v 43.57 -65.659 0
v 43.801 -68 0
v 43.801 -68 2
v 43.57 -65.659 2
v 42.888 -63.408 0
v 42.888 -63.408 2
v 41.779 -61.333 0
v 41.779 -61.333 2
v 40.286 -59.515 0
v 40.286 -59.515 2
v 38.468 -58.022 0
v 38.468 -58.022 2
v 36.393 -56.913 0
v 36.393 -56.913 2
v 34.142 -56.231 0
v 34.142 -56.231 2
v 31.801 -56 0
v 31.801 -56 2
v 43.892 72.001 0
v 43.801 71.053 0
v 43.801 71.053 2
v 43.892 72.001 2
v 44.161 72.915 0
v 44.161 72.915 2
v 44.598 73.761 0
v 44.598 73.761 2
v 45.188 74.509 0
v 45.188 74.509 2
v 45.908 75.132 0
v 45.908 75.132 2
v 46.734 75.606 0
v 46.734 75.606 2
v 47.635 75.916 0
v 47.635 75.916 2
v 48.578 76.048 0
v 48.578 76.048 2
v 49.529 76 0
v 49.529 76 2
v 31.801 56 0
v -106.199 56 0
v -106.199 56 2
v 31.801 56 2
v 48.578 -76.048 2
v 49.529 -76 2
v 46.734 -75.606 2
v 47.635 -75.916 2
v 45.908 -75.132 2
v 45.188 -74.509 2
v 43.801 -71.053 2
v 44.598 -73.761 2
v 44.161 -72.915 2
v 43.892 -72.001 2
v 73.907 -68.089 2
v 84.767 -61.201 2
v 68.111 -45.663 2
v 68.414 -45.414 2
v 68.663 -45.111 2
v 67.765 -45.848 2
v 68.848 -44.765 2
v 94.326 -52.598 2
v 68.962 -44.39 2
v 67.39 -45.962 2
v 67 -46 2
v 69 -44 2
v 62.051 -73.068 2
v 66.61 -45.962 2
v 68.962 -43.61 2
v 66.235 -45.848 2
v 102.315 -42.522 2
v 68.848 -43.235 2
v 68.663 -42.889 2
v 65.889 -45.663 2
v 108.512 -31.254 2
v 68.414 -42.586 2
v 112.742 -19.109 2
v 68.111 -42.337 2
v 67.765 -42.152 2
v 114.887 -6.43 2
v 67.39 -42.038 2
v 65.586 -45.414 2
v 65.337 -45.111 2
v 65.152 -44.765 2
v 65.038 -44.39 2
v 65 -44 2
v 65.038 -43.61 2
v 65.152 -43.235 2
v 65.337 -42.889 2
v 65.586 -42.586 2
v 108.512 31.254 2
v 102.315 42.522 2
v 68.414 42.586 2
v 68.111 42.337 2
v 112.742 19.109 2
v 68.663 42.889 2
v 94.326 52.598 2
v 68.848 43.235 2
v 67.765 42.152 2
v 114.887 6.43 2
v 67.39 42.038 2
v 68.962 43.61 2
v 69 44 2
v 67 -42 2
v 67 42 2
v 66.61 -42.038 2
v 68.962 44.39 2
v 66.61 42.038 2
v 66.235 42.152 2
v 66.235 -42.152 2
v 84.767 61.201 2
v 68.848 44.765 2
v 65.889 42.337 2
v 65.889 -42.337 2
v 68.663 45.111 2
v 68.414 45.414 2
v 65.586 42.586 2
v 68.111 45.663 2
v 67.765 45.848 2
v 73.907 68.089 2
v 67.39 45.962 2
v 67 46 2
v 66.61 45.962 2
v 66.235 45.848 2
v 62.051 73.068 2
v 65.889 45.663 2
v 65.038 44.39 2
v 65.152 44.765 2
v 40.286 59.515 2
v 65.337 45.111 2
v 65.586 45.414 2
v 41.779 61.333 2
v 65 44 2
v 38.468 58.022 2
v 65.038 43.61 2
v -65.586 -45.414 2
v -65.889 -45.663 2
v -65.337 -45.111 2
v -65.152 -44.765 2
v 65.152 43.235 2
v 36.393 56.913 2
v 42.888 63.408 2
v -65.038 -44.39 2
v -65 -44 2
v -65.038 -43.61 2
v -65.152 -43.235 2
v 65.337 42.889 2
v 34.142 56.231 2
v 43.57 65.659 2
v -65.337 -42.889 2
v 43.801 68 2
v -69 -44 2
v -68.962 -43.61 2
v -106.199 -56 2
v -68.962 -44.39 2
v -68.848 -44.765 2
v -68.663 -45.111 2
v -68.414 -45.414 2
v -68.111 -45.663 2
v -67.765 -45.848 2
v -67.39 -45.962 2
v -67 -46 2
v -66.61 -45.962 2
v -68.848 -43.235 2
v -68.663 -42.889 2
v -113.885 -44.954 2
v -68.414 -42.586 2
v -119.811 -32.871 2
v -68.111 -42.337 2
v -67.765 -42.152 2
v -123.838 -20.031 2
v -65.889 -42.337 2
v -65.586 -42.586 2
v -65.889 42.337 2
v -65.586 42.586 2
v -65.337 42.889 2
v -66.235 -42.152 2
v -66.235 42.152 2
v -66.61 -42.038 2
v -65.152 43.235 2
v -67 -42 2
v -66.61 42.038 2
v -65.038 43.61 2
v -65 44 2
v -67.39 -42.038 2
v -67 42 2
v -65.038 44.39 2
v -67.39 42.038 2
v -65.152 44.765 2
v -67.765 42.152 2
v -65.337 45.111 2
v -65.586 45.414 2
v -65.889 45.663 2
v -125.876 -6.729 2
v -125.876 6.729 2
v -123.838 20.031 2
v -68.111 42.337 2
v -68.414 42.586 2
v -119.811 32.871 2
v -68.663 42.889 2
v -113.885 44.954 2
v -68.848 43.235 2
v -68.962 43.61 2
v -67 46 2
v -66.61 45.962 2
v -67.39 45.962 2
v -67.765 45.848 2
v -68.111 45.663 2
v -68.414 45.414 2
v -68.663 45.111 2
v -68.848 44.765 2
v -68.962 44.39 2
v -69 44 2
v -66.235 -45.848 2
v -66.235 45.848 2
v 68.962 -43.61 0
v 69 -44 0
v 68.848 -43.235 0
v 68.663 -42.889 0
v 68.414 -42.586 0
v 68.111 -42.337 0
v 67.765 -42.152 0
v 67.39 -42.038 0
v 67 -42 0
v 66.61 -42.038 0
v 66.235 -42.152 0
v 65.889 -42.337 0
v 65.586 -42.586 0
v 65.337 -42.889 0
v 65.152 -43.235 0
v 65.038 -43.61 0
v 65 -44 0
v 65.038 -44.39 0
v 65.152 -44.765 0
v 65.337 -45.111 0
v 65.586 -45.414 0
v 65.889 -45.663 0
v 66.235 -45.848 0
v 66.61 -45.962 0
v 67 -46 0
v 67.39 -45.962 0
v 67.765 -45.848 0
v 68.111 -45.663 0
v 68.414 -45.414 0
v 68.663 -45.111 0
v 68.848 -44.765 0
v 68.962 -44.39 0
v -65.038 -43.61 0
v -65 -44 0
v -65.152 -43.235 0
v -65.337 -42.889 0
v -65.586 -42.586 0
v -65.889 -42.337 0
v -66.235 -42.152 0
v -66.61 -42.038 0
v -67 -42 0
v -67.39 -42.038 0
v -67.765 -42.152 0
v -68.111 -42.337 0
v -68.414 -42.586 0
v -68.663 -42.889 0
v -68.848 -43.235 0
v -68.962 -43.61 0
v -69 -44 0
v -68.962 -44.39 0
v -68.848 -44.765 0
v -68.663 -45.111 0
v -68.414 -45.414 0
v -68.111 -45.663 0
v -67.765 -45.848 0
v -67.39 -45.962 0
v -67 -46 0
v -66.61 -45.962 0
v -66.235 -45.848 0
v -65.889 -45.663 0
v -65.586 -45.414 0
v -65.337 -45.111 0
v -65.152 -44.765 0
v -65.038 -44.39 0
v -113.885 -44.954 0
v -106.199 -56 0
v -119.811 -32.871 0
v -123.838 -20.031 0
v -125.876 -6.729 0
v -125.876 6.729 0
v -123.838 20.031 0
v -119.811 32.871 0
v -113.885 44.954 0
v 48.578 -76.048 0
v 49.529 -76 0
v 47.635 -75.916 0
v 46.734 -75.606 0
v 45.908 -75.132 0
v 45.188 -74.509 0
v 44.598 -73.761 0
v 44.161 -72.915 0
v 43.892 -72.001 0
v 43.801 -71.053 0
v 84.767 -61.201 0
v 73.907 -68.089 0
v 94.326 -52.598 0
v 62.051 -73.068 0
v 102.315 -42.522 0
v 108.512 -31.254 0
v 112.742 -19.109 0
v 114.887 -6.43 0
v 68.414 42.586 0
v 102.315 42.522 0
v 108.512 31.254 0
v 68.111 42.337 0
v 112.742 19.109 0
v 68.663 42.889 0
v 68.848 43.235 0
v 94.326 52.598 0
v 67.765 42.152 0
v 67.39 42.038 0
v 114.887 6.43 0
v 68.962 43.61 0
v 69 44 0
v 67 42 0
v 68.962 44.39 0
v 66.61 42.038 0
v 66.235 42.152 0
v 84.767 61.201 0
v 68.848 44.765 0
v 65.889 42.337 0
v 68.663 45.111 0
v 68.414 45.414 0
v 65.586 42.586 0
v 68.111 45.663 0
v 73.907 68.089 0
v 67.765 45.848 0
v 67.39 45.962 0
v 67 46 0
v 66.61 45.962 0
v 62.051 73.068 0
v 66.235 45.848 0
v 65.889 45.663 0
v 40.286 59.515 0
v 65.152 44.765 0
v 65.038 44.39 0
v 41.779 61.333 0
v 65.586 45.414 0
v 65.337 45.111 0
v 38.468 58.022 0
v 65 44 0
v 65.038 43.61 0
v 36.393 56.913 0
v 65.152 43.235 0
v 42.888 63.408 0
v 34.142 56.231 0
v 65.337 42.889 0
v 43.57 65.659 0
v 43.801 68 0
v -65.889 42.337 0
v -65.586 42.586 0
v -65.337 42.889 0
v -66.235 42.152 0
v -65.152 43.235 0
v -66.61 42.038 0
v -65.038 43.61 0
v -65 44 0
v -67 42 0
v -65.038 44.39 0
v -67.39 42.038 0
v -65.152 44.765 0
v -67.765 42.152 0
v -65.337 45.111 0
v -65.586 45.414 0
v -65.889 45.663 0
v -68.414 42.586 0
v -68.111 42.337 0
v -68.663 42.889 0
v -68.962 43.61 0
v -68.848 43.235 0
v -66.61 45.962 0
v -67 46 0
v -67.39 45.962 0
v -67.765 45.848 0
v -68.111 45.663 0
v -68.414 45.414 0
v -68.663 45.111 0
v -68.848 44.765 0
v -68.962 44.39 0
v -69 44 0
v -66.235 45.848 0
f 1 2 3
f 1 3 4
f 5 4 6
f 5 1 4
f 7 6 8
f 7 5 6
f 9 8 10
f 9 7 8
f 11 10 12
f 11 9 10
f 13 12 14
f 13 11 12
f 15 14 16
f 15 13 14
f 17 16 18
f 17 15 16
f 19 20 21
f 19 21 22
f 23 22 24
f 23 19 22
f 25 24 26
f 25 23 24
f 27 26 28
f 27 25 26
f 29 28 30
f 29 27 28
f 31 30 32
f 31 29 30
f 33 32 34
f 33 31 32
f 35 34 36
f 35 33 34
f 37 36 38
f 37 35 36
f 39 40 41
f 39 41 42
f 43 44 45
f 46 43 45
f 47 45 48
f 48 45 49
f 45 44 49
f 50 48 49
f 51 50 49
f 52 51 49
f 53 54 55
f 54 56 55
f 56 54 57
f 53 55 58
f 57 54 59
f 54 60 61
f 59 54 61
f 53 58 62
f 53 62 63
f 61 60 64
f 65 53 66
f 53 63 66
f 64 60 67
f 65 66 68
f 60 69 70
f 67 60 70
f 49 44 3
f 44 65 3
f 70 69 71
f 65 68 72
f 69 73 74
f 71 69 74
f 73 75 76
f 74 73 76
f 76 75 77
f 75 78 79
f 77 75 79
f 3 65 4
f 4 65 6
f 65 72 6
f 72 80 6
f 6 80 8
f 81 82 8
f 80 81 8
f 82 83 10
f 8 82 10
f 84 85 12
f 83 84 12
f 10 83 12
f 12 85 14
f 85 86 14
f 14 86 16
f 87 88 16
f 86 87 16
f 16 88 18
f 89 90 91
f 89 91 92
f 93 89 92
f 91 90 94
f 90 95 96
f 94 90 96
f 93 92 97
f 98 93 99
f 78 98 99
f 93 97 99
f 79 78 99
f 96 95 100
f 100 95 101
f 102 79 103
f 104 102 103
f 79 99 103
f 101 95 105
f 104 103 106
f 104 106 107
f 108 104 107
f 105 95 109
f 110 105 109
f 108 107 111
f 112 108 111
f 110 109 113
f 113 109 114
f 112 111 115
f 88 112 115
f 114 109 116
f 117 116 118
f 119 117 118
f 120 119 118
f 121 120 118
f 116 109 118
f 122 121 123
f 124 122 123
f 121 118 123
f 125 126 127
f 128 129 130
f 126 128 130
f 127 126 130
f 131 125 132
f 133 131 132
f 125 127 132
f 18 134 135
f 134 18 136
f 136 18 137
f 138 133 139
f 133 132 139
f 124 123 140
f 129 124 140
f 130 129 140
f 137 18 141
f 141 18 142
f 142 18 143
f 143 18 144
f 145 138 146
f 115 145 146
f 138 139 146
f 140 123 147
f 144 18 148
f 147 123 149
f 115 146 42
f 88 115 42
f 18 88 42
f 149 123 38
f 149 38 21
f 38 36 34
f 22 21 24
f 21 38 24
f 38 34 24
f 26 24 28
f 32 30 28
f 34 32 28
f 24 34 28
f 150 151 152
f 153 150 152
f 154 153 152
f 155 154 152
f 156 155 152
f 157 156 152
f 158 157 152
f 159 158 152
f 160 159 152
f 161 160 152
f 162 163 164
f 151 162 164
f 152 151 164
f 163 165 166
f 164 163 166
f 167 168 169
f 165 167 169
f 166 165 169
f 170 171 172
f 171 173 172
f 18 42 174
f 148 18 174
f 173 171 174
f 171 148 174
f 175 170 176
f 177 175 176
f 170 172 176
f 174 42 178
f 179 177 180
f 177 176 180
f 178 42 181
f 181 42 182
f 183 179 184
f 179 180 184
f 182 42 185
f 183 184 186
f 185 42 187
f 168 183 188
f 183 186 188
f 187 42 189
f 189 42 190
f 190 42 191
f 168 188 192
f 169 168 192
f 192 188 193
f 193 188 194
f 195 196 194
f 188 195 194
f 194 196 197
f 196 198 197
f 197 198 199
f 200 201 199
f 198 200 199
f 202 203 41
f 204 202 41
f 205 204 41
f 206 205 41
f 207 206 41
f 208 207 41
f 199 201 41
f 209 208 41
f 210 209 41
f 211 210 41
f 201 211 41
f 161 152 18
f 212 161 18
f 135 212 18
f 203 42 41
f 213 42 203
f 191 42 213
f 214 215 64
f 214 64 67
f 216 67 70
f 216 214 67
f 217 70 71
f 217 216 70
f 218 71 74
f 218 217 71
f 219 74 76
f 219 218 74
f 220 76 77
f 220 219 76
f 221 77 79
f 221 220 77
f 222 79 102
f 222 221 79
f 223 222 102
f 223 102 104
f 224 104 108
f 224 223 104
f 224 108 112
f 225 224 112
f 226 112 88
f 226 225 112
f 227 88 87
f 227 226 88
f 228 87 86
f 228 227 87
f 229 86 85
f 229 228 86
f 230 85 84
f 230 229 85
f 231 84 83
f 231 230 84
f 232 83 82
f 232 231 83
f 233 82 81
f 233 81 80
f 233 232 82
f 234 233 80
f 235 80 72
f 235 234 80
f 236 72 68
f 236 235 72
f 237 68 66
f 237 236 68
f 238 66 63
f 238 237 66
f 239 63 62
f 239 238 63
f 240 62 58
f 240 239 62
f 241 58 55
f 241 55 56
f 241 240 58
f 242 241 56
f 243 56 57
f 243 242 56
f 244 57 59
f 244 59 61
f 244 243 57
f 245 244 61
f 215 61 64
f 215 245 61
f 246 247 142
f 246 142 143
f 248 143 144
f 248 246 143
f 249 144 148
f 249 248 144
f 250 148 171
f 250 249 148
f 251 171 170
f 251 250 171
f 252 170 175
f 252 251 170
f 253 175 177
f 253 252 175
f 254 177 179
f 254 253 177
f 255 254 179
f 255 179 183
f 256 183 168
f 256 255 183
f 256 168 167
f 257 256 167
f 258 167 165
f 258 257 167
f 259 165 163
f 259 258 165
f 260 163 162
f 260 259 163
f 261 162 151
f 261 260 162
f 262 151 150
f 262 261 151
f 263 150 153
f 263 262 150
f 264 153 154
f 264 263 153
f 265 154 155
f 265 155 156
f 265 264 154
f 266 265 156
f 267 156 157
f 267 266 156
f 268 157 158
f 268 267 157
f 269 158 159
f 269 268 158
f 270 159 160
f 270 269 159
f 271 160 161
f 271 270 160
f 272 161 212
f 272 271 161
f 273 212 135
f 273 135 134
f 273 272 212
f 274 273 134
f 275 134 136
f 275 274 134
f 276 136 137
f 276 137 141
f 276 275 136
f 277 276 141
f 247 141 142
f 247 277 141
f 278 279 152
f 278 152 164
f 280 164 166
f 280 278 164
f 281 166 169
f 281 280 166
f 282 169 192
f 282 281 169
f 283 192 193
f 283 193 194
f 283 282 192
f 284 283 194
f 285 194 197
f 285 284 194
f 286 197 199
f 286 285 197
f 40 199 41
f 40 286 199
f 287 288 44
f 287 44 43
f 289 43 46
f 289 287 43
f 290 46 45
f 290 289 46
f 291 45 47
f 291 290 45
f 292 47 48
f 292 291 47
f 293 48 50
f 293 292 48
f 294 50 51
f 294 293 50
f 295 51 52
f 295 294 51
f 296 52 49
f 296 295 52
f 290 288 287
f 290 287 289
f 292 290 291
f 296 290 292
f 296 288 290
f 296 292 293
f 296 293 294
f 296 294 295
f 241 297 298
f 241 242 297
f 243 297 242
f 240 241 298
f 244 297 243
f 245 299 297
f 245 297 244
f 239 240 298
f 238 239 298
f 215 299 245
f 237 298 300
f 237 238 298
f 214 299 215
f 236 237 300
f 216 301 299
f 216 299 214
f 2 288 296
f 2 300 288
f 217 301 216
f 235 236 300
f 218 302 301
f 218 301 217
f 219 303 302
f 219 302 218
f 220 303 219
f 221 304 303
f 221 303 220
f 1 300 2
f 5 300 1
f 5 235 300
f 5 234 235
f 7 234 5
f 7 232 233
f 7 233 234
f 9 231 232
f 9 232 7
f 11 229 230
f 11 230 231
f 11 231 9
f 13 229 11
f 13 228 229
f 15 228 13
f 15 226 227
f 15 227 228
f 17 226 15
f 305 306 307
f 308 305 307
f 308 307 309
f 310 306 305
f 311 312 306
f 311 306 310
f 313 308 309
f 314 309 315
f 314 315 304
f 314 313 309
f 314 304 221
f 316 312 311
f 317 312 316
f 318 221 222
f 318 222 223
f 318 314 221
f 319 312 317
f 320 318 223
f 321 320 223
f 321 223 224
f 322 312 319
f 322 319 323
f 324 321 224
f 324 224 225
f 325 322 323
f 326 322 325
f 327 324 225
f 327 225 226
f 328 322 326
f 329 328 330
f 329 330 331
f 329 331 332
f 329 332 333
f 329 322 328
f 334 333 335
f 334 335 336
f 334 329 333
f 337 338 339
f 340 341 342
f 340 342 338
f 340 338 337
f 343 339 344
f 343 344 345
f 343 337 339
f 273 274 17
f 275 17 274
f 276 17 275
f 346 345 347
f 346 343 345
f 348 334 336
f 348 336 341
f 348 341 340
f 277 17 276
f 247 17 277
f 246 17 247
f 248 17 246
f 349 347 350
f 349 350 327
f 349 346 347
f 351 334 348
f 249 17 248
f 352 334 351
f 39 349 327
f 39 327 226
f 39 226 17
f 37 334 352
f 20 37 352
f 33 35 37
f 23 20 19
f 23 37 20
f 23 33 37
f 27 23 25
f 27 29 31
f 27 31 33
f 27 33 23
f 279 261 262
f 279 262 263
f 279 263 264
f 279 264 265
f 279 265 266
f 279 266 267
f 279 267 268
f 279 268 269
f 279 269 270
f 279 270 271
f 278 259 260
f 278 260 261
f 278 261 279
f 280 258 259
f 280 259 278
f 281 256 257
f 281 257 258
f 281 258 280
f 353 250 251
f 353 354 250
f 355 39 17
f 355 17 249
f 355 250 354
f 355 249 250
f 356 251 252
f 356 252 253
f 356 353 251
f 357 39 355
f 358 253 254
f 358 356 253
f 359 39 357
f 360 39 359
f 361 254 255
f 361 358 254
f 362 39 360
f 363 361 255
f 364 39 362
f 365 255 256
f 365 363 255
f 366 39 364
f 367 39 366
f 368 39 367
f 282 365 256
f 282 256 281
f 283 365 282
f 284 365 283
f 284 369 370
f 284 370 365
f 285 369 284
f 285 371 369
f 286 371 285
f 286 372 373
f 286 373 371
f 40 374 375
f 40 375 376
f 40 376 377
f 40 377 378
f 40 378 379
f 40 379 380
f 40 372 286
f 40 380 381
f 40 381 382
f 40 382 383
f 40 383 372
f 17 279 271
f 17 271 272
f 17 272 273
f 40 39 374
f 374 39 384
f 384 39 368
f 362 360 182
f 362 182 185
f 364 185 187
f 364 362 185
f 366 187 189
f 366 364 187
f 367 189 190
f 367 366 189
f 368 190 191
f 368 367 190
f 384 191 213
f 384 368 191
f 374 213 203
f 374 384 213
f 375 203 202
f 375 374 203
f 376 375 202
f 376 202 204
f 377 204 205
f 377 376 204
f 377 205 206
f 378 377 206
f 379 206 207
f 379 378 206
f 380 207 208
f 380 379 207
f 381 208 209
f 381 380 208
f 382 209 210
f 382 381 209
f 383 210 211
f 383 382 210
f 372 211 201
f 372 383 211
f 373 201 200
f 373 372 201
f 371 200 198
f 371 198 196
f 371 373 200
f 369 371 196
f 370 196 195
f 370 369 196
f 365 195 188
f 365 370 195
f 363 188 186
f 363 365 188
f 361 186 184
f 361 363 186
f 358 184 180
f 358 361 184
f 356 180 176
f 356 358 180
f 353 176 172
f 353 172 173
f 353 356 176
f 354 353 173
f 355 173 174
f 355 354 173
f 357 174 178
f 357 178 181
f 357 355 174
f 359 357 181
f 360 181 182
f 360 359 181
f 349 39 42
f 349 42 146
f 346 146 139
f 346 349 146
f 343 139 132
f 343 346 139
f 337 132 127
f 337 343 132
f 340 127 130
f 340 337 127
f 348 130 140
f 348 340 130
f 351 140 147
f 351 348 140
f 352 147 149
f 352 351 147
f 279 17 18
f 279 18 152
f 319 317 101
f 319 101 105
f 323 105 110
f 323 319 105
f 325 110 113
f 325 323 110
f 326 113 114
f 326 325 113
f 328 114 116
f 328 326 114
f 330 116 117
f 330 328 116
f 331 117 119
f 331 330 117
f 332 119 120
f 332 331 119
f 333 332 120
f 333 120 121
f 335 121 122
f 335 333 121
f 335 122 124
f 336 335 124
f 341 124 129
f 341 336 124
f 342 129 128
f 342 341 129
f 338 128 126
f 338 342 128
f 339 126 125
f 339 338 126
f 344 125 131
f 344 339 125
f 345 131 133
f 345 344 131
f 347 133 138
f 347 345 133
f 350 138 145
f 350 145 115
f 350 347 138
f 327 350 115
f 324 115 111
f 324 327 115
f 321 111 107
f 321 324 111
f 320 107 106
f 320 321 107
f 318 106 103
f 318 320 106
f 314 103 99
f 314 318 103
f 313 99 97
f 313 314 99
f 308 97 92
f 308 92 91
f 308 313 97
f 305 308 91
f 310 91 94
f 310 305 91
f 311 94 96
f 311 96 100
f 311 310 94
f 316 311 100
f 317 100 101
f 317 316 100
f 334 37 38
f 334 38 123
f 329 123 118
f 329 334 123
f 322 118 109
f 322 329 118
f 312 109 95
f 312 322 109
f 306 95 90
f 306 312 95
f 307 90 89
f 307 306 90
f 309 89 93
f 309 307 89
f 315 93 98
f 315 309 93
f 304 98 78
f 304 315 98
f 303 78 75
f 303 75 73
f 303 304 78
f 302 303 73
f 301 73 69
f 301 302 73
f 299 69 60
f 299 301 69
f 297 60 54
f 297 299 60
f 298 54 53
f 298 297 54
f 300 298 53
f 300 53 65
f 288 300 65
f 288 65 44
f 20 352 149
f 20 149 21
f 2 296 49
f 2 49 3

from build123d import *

# Parameters (mm, degrees)
SKETCH1_R           = 2
BOSS_EXTRUDE1_DEPTH = 2


with BuildPart() as part:
    # Sketch1 → Boss-Extrude1 (new body)
    with BuildSketch(Plane.XY):
        with BuildLine():
            Line((43.801010204, 68), (43.801010204, 71.053350769))
            ThreePointArc((43.801010204, 71.053350769), (45.533161176, 74.837681982), (49.529475295, 76))
            ThreePointArc((49.529475295, 76), (115.157062367, 0), (49.529475295, -76))
            ThreePointArc((49.529475295, -76), (45.533161176, -74.837681982), (43.801010204, -71.053350769))
            Line((43.801010204, -71.053350769), (43.801010204, -68))
            ThreePointArc((43.801010204, -68), (40.286291578, -59.514718626), (31.801010204, -56))
            Line((31.801010204, -56), (-106.198989796, -56))
            ThreePointArc((-106.198989796, -56), (-126.131547425, 0), (-106.198989796, 56))
            Line((-106.198989796, 56), (31.801010204, 56))
            ThreePointArc((31.801010204, 56), (40.286291578, 59.514718626), (43.801010204, 68))
        make_face()
        with Locations((67, 44)):
            Circle(SKETCH1_R, mode=Mode.SUBTRACT)
        with Locations((67, -44)):
            Circle(SKETCH1_R, mode=Mode.SUBTRACT)
        with Locations((-67, 44)):
            Circle(SKETCH1_R, mode=Mode.SUBTRACT)
        with Locations((-67, -44)):
            Circle(SKETCH1_R, mode=Mode.SUBTRACT)
    extrude(amount=BOSS_EXTRUDE1_DEPTH)


solid = part.part
